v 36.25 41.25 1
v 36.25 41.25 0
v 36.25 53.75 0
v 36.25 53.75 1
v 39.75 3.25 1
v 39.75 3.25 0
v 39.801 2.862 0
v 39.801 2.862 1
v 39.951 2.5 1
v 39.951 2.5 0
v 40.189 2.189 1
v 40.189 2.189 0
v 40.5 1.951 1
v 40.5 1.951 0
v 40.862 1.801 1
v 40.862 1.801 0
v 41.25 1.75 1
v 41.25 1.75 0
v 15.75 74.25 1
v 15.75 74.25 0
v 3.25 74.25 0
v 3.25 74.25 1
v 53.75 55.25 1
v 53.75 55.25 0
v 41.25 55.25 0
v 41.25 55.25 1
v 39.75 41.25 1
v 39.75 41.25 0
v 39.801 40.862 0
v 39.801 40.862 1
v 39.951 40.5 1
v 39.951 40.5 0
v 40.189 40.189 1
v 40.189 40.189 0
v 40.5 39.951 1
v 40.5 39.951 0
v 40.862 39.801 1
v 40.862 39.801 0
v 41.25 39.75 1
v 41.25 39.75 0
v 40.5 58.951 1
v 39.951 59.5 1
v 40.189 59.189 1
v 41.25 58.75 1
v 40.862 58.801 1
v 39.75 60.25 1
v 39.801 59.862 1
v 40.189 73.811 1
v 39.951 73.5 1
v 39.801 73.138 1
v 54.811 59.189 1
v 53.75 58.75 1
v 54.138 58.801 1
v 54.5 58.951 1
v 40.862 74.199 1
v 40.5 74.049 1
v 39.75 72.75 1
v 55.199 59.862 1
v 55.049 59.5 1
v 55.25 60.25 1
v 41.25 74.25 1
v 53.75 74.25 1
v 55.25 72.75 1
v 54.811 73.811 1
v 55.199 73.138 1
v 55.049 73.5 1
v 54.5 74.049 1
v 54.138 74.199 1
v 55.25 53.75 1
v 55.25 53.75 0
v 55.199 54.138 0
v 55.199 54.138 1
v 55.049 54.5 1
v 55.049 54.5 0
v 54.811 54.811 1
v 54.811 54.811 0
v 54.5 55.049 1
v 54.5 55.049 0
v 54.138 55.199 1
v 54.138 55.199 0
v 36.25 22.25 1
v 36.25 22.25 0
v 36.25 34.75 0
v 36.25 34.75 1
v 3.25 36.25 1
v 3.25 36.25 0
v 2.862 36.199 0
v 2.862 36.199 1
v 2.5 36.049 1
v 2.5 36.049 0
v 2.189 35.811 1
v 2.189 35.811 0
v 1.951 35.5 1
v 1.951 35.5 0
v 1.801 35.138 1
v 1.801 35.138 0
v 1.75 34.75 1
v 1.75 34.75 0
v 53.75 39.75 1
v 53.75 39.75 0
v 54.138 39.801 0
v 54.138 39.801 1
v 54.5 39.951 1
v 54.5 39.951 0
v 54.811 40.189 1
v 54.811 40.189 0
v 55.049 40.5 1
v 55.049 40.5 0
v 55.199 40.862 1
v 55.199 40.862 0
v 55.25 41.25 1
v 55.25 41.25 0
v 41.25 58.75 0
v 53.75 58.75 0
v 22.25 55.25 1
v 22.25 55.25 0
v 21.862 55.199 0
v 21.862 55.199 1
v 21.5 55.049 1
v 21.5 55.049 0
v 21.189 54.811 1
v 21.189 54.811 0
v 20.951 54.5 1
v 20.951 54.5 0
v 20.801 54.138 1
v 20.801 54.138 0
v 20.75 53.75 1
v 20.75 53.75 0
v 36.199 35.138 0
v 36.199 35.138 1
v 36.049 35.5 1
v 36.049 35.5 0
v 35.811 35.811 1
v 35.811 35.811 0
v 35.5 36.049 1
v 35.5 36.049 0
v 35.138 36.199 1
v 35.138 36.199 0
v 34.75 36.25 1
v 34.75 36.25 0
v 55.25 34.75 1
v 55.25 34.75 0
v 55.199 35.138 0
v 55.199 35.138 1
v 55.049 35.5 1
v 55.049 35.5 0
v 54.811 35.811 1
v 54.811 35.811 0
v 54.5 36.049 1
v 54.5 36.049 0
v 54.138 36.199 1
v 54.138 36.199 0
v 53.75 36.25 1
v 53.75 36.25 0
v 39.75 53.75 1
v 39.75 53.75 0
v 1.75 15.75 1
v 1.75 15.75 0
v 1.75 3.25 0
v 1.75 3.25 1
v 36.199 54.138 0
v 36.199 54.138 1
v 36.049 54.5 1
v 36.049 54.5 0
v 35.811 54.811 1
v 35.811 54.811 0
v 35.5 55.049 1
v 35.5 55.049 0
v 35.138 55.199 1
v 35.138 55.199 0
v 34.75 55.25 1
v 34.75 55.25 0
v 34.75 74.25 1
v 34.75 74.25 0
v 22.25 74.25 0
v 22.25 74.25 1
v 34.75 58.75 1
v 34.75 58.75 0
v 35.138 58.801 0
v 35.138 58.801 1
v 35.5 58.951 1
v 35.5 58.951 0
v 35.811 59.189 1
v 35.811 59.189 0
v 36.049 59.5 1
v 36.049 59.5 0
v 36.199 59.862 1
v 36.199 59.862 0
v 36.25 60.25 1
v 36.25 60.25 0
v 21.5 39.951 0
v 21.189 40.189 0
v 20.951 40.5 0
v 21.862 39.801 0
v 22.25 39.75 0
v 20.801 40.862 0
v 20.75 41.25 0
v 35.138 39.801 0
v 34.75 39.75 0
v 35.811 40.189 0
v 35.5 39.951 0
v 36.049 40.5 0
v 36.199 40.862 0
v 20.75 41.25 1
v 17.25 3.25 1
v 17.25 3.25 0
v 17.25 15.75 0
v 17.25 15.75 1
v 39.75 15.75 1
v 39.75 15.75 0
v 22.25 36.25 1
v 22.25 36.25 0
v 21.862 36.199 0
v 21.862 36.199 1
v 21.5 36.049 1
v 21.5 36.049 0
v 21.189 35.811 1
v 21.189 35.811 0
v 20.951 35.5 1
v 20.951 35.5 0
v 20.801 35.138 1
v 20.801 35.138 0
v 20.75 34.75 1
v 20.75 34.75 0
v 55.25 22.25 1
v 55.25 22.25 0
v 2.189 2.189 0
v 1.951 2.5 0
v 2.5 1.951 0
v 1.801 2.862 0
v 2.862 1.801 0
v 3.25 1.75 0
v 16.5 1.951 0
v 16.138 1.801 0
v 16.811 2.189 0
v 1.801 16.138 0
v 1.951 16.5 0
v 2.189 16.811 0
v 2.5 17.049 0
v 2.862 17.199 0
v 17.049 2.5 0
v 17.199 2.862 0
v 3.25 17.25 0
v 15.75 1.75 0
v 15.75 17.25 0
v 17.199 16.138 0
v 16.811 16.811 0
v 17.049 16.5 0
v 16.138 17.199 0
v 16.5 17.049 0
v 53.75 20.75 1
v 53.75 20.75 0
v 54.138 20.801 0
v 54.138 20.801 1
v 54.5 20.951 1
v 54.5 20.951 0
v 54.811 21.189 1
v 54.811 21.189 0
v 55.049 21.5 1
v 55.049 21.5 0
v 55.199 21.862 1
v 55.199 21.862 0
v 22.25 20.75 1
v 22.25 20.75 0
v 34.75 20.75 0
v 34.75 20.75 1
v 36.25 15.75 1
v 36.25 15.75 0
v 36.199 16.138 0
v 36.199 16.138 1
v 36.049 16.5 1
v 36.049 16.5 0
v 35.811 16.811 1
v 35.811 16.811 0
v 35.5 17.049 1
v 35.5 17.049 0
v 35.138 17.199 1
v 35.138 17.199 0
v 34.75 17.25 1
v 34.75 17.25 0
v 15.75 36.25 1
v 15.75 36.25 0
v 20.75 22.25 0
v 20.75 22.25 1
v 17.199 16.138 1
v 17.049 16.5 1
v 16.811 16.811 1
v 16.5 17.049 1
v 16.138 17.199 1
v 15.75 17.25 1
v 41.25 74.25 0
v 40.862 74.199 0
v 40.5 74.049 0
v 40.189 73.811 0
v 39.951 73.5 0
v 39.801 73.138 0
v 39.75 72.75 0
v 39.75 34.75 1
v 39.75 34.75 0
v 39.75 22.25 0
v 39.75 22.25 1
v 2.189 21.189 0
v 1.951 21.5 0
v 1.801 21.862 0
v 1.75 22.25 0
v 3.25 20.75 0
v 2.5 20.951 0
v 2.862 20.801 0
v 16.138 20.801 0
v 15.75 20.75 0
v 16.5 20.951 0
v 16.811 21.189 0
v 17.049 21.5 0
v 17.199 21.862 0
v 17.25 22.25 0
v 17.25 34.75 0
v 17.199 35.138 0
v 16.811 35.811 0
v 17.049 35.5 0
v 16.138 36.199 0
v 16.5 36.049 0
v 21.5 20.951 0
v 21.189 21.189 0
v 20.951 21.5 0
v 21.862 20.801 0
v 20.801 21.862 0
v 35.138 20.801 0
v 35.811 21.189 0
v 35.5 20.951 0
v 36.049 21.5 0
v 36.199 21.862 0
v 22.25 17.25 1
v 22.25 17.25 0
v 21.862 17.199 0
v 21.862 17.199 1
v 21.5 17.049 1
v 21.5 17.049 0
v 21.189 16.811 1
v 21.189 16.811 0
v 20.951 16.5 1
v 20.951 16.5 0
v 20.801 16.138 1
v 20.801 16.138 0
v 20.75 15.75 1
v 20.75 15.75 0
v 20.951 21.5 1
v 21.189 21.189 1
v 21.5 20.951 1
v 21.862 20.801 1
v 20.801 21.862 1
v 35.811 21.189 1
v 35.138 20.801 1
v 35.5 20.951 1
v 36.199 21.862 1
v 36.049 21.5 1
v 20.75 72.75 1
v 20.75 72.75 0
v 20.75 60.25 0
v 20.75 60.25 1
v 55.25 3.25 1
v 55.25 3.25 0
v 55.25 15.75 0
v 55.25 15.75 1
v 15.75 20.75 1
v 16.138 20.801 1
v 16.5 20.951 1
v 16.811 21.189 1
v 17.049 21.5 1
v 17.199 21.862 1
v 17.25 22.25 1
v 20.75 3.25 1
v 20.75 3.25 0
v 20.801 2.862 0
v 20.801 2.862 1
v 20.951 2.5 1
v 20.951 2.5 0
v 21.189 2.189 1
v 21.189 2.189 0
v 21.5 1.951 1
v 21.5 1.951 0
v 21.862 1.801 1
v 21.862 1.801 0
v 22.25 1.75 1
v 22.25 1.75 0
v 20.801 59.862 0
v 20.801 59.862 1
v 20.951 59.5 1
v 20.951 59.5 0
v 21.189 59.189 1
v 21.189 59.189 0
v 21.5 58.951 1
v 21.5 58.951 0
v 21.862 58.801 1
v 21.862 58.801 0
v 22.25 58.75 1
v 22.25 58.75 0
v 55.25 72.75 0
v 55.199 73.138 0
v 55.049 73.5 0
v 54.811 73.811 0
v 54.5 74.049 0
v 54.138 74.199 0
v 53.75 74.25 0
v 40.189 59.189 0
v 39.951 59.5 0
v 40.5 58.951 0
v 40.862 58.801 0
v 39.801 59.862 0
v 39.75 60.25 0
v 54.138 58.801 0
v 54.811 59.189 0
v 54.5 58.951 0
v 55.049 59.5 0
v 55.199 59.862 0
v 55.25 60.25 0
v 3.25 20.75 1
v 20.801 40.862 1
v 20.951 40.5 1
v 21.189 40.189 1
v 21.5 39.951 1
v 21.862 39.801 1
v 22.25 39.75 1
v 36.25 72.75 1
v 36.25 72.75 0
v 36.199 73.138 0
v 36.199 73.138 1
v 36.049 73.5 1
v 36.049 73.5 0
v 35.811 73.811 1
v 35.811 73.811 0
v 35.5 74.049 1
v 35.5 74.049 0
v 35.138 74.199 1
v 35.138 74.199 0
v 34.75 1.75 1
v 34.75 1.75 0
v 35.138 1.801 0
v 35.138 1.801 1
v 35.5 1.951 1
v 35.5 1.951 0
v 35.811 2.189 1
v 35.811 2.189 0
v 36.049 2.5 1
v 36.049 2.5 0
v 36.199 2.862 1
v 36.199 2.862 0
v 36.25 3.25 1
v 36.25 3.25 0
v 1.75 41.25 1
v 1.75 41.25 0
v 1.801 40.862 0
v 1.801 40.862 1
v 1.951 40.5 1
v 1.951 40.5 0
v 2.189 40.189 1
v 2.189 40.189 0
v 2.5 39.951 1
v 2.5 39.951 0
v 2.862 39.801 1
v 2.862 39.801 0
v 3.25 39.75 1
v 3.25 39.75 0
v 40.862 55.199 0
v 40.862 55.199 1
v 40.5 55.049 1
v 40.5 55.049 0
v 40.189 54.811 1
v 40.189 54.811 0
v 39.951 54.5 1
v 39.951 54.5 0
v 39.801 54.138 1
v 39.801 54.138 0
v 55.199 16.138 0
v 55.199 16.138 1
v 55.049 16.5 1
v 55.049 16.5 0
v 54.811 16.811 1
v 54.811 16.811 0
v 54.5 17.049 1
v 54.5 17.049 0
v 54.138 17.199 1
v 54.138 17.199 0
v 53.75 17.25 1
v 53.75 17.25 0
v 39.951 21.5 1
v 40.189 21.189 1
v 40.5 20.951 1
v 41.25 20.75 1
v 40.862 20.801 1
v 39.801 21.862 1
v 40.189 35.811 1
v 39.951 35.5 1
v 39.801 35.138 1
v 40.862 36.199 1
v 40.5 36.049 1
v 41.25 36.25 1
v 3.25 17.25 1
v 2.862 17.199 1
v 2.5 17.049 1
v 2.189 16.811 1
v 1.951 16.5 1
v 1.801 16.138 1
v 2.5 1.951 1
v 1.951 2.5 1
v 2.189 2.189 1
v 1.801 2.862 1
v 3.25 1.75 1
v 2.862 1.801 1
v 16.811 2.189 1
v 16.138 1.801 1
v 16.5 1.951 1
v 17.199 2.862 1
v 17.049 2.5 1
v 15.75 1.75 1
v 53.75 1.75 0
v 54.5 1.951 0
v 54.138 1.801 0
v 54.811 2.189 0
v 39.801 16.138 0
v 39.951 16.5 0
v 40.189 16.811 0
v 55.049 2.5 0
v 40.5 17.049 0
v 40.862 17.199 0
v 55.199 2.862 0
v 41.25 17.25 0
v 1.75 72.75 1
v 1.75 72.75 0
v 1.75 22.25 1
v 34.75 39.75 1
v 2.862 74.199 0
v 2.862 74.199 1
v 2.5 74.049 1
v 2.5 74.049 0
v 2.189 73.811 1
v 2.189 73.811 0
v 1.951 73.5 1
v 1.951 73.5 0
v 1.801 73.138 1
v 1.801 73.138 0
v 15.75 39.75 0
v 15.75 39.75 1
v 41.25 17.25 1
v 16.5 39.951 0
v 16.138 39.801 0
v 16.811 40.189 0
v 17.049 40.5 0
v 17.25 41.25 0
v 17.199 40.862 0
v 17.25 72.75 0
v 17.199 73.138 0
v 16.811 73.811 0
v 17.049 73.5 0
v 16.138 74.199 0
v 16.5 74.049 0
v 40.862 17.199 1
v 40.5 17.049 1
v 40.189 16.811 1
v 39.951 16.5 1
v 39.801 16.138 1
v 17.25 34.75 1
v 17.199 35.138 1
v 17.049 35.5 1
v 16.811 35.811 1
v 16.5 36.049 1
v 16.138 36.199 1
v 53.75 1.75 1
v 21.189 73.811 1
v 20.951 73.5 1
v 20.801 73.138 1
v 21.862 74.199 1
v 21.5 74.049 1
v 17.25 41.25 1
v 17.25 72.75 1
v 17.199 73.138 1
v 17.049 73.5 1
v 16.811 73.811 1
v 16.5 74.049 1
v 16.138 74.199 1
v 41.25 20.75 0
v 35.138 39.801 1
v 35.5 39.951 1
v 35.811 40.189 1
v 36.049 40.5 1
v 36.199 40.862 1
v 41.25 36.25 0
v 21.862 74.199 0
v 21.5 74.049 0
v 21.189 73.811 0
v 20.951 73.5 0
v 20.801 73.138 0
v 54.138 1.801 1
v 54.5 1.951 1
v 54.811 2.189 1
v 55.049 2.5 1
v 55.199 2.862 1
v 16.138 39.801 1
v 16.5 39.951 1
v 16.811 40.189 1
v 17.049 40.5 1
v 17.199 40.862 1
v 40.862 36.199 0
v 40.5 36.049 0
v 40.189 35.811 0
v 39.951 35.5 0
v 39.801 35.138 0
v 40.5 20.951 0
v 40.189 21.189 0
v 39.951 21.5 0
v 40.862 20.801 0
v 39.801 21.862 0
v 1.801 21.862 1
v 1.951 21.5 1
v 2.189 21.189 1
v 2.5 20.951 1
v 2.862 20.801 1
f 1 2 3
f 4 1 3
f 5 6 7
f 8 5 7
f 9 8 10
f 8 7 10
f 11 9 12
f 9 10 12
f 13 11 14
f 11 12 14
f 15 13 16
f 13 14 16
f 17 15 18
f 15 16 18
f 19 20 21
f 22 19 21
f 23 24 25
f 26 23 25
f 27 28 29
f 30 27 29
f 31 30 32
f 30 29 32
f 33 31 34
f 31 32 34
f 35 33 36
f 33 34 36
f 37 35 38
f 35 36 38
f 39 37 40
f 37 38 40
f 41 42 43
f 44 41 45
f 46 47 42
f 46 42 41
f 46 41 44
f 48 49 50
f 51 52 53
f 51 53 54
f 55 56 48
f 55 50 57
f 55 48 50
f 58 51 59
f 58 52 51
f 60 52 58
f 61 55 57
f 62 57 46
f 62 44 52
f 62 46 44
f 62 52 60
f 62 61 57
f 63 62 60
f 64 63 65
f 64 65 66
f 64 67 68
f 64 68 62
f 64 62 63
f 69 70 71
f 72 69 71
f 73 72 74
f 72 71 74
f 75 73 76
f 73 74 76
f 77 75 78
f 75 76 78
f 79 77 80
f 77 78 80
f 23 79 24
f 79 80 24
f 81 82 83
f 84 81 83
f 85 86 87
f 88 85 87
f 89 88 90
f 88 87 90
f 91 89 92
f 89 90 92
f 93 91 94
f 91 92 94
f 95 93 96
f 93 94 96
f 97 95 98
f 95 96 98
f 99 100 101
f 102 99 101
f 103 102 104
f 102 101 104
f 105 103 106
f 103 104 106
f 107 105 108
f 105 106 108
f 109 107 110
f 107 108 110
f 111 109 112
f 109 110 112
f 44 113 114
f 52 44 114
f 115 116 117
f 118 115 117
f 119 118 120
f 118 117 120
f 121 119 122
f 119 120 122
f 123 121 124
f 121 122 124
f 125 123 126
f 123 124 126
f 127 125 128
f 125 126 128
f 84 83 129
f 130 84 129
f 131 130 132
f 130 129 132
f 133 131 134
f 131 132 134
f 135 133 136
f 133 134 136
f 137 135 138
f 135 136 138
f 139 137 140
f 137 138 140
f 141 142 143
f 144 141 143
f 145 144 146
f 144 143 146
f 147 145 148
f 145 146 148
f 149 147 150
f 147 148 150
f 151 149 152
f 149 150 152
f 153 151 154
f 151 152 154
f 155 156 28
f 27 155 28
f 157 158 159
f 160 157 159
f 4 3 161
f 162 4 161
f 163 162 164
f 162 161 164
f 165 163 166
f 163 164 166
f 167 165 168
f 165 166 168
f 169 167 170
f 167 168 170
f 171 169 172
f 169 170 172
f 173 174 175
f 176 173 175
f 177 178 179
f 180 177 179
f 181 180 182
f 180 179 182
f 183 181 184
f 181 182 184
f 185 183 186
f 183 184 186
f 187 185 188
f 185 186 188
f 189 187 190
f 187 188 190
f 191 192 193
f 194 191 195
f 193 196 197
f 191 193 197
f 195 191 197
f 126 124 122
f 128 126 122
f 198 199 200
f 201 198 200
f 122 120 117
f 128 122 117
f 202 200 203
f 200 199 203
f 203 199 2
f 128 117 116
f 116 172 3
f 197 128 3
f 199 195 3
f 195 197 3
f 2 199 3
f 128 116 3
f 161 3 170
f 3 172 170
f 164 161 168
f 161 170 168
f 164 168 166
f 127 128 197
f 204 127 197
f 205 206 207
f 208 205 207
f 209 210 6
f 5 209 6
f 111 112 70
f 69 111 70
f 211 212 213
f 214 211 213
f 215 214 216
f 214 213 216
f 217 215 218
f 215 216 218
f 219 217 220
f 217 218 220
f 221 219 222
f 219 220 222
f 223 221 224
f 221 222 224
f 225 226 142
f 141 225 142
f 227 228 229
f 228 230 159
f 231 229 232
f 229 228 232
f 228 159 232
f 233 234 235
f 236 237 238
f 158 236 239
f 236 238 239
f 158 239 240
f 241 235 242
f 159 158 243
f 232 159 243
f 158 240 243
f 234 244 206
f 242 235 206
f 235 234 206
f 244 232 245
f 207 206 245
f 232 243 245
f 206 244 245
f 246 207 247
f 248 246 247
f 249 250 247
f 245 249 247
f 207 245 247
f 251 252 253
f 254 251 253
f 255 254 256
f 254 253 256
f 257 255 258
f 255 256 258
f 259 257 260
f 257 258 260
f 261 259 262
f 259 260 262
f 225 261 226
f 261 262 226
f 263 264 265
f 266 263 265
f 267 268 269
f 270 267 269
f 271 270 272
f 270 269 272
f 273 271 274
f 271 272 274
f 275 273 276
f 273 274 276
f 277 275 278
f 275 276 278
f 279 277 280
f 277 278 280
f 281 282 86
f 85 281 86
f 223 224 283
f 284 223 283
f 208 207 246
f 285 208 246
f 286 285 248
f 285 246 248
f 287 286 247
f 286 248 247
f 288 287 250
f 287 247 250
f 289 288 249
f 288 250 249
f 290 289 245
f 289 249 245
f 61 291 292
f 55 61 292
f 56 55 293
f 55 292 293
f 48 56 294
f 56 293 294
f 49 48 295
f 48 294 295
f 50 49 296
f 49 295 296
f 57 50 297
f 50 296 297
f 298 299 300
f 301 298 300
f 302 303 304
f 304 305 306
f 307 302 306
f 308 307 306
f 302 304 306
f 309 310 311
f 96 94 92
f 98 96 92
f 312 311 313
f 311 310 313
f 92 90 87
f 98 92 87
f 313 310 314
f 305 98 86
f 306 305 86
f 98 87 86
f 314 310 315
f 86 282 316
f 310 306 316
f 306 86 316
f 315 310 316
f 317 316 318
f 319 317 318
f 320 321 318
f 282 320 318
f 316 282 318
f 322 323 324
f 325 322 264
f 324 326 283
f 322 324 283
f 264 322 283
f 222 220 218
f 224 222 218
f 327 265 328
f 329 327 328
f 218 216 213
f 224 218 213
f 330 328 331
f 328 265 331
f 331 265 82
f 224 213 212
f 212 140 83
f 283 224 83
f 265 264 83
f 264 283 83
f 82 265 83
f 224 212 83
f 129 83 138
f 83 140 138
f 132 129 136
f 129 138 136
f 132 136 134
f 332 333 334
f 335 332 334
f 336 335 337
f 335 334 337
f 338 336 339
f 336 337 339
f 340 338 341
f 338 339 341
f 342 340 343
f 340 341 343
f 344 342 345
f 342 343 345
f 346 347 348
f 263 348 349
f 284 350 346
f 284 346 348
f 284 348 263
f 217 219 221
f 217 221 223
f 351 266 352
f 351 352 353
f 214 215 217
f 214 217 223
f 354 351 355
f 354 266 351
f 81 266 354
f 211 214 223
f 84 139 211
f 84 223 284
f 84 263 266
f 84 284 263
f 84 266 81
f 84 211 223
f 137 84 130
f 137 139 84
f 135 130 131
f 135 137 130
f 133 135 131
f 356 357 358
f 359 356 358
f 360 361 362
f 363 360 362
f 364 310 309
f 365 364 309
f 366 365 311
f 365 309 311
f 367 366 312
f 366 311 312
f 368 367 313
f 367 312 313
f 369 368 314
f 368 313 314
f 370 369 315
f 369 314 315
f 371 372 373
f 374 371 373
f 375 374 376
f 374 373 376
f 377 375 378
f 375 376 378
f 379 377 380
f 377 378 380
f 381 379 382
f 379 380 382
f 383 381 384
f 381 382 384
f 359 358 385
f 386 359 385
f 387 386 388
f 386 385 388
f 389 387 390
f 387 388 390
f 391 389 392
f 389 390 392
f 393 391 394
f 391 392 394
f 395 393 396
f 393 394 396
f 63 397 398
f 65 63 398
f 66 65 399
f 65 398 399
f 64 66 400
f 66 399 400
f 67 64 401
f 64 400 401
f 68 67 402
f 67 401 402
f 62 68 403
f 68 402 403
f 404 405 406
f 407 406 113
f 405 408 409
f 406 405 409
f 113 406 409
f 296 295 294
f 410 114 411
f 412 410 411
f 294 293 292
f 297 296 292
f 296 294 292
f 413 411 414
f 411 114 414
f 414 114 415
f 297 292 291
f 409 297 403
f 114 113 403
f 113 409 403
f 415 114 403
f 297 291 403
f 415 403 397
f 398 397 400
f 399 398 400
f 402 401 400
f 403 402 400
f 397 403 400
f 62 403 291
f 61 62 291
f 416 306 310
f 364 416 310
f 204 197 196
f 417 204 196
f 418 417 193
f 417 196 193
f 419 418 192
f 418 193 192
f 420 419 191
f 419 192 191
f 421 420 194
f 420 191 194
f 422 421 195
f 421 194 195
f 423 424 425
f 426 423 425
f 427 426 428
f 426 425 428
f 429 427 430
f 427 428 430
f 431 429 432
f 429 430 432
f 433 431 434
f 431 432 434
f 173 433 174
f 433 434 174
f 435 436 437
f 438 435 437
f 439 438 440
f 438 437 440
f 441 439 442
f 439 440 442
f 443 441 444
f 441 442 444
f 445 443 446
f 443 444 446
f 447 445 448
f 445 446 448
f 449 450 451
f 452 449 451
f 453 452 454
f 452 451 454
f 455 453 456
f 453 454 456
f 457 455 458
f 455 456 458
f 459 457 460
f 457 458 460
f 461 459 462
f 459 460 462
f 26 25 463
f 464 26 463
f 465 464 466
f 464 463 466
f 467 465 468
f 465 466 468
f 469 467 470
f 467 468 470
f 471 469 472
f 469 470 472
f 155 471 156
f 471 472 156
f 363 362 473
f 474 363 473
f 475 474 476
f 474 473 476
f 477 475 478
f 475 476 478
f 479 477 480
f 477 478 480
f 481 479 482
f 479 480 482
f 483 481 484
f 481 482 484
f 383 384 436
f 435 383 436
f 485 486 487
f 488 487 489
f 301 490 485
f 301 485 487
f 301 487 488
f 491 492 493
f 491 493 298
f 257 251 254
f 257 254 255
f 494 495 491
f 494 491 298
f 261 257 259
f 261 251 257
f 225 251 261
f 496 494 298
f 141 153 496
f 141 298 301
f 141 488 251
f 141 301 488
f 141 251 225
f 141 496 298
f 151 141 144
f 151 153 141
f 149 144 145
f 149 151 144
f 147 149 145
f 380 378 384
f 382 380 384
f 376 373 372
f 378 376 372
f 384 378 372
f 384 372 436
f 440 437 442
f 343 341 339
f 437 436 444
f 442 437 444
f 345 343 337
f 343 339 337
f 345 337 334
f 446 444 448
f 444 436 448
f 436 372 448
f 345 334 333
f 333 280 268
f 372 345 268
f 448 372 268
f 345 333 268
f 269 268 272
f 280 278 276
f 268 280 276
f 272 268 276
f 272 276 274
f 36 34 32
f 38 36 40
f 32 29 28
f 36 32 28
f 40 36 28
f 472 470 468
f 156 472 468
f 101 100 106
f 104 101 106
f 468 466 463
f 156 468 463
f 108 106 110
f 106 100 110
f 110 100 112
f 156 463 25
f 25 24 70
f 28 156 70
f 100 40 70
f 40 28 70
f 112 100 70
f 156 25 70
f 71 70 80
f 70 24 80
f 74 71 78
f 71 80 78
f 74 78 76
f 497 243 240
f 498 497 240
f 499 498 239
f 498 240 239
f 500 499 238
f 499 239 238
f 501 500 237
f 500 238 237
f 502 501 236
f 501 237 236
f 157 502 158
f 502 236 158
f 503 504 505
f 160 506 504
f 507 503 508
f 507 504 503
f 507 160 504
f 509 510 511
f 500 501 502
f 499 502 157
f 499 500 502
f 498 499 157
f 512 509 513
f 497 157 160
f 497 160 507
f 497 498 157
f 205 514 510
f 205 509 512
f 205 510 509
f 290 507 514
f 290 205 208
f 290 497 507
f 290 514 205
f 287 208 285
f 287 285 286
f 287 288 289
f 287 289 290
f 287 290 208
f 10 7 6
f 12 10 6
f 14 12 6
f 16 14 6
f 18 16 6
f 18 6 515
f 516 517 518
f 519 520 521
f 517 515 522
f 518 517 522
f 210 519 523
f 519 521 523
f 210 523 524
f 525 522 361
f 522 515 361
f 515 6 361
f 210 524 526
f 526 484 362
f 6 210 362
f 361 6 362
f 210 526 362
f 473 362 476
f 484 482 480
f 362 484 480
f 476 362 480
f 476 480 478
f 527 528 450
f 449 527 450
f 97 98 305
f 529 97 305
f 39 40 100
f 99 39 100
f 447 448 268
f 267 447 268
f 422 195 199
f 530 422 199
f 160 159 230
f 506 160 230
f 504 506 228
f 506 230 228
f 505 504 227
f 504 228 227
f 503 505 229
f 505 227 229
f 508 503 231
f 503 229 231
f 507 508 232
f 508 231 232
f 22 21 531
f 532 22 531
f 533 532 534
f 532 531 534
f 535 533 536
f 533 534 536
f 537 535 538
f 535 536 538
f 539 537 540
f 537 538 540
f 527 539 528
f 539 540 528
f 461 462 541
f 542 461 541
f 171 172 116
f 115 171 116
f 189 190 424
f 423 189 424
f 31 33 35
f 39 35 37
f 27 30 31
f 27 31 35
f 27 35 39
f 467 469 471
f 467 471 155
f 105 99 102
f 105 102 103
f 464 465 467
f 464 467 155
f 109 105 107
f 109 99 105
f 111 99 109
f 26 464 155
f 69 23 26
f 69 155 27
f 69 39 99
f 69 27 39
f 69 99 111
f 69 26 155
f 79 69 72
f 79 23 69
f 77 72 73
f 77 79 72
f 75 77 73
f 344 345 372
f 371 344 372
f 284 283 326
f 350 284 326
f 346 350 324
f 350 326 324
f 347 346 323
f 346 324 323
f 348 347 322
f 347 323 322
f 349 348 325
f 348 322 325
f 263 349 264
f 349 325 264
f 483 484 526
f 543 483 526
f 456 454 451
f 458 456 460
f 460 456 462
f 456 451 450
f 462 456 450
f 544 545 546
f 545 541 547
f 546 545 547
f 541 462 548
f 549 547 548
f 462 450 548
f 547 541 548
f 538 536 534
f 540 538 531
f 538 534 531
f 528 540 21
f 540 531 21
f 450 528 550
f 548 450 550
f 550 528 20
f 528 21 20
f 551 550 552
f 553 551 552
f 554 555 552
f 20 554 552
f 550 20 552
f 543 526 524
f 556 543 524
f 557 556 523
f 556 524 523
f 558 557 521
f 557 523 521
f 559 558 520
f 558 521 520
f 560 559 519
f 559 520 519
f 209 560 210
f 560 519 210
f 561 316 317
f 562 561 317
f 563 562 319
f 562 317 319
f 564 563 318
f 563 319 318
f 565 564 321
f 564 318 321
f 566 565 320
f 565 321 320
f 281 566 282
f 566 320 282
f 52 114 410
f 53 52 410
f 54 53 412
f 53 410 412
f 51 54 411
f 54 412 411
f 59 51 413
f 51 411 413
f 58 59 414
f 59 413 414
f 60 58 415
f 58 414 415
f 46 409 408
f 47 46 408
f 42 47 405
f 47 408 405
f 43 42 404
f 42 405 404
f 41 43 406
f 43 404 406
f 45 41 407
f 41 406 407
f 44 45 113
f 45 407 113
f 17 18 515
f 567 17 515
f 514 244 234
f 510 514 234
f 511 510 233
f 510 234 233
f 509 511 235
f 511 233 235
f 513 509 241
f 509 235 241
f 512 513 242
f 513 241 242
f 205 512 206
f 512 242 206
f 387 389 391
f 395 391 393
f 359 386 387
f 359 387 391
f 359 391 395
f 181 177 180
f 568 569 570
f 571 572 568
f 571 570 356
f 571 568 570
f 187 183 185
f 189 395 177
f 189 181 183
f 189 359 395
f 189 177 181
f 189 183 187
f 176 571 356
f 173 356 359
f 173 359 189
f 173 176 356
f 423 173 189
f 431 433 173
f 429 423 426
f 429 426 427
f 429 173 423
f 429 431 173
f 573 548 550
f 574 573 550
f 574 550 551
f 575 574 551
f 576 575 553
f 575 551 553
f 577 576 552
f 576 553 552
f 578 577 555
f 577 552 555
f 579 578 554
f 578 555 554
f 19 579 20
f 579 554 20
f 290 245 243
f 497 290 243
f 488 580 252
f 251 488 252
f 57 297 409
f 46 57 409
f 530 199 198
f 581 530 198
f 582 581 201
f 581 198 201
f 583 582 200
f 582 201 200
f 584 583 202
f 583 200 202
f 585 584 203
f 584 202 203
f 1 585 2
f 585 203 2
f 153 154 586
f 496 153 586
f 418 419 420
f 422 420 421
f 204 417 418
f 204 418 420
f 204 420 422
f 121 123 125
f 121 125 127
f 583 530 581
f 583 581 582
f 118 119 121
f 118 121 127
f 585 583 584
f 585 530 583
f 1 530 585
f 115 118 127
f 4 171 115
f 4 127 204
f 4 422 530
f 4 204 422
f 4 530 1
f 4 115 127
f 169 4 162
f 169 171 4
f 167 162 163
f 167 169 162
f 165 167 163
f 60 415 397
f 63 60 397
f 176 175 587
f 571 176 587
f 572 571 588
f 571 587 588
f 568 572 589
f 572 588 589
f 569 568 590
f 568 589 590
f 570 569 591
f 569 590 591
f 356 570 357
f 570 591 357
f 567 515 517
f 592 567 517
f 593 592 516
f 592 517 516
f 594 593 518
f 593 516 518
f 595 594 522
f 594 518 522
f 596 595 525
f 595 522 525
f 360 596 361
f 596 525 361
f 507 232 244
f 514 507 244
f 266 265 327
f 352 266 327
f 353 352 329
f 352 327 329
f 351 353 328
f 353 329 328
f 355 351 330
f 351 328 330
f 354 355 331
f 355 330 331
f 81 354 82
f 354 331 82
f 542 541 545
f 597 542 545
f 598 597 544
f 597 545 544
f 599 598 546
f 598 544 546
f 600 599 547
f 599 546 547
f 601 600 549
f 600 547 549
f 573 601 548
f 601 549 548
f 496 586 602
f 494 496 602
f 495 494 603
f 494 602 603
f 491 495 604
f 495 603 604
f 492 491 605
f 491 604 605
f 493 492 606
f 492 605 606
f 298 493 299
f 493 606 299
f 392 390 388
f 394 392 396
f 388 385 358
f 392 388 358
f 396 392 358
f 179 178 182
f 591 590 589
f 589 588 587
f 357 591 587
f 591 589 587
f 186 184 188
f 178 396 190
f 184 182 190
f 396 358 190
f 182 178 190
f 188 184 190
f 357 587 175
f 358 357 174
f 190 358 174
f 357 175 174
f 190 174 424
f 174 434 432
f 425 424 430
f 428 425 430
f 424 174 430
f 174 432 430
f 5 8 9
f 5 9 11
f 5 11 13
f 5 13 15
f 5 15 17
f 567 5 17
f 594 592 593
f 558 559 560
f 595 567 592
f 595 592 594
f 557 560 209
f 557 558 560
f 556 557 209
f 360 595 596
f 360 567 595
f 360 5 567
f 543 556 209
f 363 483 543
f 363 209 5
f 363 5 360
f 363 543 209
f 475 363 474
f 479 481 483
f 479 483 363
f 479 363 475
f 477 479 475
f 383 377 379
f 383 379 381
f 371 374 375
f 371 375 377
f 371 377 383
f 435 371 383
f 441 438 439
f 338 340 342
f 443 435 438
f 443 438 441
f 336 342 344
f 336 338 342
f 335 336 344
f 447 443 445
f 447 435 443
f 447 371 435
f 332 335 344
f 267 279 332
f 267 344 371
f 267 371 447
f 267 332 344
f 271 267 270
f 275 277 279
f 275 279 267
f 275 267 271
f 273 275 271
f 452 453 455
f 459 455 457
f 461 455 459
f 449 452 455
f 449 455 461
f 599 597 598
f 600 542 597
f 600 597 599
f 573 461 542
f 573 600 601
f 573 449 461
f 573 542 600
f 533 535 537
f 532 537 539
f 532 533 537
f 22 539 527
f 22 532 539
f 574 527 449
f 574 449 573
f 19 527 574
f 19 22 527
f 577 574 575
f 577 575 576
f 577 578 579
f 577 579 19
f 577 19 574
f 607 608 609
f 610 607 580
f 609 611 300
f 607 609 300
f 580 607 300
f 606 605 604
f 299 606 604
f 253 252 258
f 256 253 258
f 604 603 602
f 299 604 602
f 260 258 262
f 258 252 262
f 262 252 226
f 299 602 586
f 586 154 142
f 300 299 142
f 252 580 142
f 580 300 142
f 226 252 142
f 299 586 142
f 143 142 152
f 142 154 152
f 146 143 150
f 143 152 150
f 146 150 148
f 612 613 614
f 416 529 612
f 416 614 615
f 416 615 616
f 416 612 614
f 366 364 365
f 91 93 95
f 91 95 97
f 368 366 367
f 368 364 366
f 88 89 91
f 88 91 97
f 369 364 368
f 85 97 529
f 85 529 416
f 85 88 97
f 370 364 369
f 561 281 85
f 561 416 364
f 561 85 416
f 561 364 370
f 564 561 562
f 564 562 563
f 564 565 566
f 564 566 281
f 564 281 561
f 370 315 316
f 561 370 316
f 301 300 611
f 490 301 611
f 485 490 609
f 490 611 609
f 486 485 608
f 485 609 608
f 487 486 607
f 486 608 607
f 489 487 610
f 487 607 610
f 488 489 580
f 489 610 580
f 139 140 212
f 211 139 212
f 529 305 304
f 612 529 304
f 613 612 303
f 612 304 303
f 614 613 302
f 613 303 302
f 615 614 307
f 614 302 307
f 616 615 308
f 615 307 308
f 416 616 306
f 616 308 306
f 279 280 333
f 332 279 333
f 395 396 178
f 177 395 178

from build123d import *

# Parameters (mm, degrees)
F1_DEPTH = 1


with BuildPart() as f1:
    # F0 (on Top) → F1 (new body)
    with BuildSketch(Plane.XY):
        with BuildLine():
            Line((15.75, 17.25), (3.25, 17.25))
            ThreePointArc((3.25, 17.25), (2.18934, 16.81066), (1.75, 15.75))
            Line((1.75, 15.75), (1.75, 3.25))
            ThreePointArc((1.75, 3.25), (2.18934, 2.18934), (3.25, 1.75))
            Line((3.25, 1.75), (15.75, 1.75))
            ThreePointArc((15.75, 1.75), (16.81066, 2.18934), (17.25, 3.25))
            Line((17.25, 3.25), (17.25, 15.75))
            ThreePointArc((17.25, 15.75), (16.81066, 16.81066), (15.75, 17.25))
        make_face()
        with BuildLine():
            Line((17.25, 22.25), (17.25, 34.75))
            ThreePointArc((17.25, 34.75), (16.81066, 35.81066), (15.75, 36.25))
            Line((15.75, 36.25), (3.25, 36.25))
            ThreePointArc((3.25, 36.25), (2.18934, 35.81066), (1.75, 34.75))
            Line((1.75, 34.75), (1.75, 22.25))
            ThreePointArc((1.75, 22.25), (2.18934, 21.18934), (3.25, 20.75))
            Line((3.25, 20.75), (15.75, 20.75))
            ThreePointArc((15.75, 20.75), (16.81066, 21.18934), (17.25, 22.25))
        make_face()
        with BuildLine():
            Line((3.25, 39.75), (15.75, 39.75))
            ThreePointArc((15.75, 39.75), (16.81066, 40.18934), (17.25, 41.25))
            Line((17.25, 41.25), (17.25, 53.75))
            Line((17.25, 53.75), (17.25, 60.25))
            Line((17.25, 60.25), (17.25, 72.75))
            ThreePointArc((17.25, 72.75), (16.81066, 73.81066), (15.75, 74.25))
            Line((15.75, 74.25), (3.25, 74.25))
            ThreePointArc((3.25, 74.25), (2.18934, 73.81066), (1.75, 72.75))
            Line((1.75, 72.75), (1.75, 60.25))
            Line((1.75, 60.25), (1.75, 53.75))
            Line((1.75, 53.75), (1.75, 41.25))
            ThreePointArc((1.75, 41.25), (2.18934, 40.18934), (3.25, 39.75))
        make_face()
        with BuildLine():
            Line((36.25, 3.25), (36.25, 15.75))
            ThreePointArc((36.25, 15.75), (35.81066, 16.81066), (34.75, 17.25))
            Line((34.75, 17.25), (22.25, 17.25))
            ThreePointArc((22.25, 17.25), (21.18934, 16.81066), (20.75, 15.75))
            Line((20.75, 15.75), (20.75, 3.25))
            ThreePointArc((20.75, 3.25), (21.18934, 2.18934), (22.25, 1.75))
            Line((22.25, 1.75), (34.75, 1.75))
            ThreePointArc((34.75, 1.75), (35.81066, 2.18934), (36.25, 3.25))
        make_face()
        with BuildLine():
            Line((36.25, 22.25), (36.25, 34.75))
            ThreePointArc((36.25, 34.75), (35.81066, 35.81066), (34.75, 36.25))
            Line((34.75, 36.25), (22.25, 36.25))
            ThreePointArc((22.25, 36.25), (21.18934, 35.81066), (20.75, 34.75))
            Line((20.75, 34.75), (20.75, 22.25))
            ThreePointArc((20.75, 22.25), (21.18934, 21.18934), (22.25, 20.75))
            Line((22.25, 20.75), (34.75, 20.75))
            ThreePointArc((34.75, 20.75), (35.81066, 21.18934), (36.25, 22.25))
        make_face()
        with BuildLine():
            Line((36.25, 41.25), (36.25, 53.75))
            ThreePointArc((36.25, 53.75), (35.81066, 54.81066), (34.75, 55.25))
            Line((34.75, 55.25), (22.25, 55.25))
            ThreePointArc((22.25, 55.25), (21.18934, 54.81066), (20.75, 53.75))
            Line((20.75, 53.75), (20.75, 41.25))
            ThreePointArc((20.75, 41.25), (21.18934, 40.18934), (22.25, 39.75))
            Line((22.25, 39.75), (34.75, 39.75))
            ThreePointArc((34.75, 39.75), (35.81066, 40.18934), (36.25, 41.25))
        make_face()
        with BuildLine():
            Line((36.25, 60.25), (36.25, 72.75))
            ThreePointArc((36.25, 72.75), (35.81066, 73.81066), (34.75, 74.25))
            Line((34.75, 74.25), (22.25, 74.25))
            ThreePointArc((22.25, 74.25), (21.18934, 73.81066), (20.75, 72.75))
            Line((20.75, 72.75), (20.75, 60.25))
            ThreePointArc((20.75, 60.25), (21.18934, 59.18934), (22.25, 58.75))
            Line((22.25, 58.75), (34.75, 58.75))
            ThreePointArc((34.75, 58.75), (35.81066, 59.18934), (36.25, 60.25))
        make_face()
        with BuildLine():
            Line((55.25, 3.25), (55.25, 15.75))
            ThreePointArc((55.25, 15.75), (54.81066, 16.81066), (53.75, 17.25))
            Line((53.75, 17.25), (41.25, 17.25))
            ThreePointArc((41.25, 17.25), (40.18934, 16.81066), (39.75, 15.75))
            Line((39.75, 15.75), (39.75, 3.25))
            ThreePointArc((39.75, 3.25), (40.18934, 2.18934), (41.25, 1.75))
            Line((41.25, 1.75), (53.75, 1.75))
            ThreePointArc((53.75, 1.75), (54.81066, 2.18934), (55.25, 3.25))
        make_face()
        with BuildLine():
            Line((55.25, 22.25), (55.25, 34.75))
            ThreePointArc((55.25, 34.75), (54.81066, 35.81066), (53.75, 36.25))
            Line((53.75, 36.25), (41.25, 36.25))
            ThreePointArc((41.25, 36.25), (40.18934, 35.81066), (39.75, 34.75))
            Line((39.75, 34.75), (39.75, 22.25))
            ThreePointArc((39.75, 22.25), (40.18934, 21.18934), (41.25, 20.75))
            Line((41.25, 20.75), (53.75, 20.75))
            ThreePointArc((53.75, 20.75), (54.81066, 21.18934), (55.25, 22.25))
        make_face()
        with BuildLine():
            Line((55.25, 41.25), (55.25, 53.75))
            ThreePointArc((55.25, 53.75), (54.81066, 54.81066), (53.75, 55.25))
            Line((53.75, 55.25), (41.25, 55.25))
            ThreePointArc((41.25, 55.25), (40.18934, 54.81066), (39.75, 53.75))
            Line((39.75, 53.75), (39.75, 41.25))
            ThreePointArc((39.75, 41.25), (40.18934, 40.18934), (41.25, 39.75))
            Line((41.25, 39.75), (53.75, 39.75))
            ThreePointArc((53.75, 39.75), (54.81066, 40.18934), (55.25, 41.25))
        make_face()
        with BuildLine():
            Line((55.25, 60.25), (55.25, 72.75))
            ThreePointArc((55.25, 72.75), (54.81066, 73.81066), (53.75, 74.25))
            Line((53.75, 74.25), (41.25, 74.25))
            ThreePointArc((41.25, 74.25), (40.18934, 73.81066), (39.75, 72.75))
            Line((39.75, 72.75), (39.75, 60.25))
            ThreePointArc((39.75, 60.25), (40.18934, 59.18934), (41.25, 58.75))
            Line((41.25, 58.75), (53.75, 58.75))
            ThreePointArc((53.75, 58.75), (54.81066, 59.18934), (55.25, 60.25))
        make_face()
    extrude(amount=F1_DEPTH)


solid = f1.part
